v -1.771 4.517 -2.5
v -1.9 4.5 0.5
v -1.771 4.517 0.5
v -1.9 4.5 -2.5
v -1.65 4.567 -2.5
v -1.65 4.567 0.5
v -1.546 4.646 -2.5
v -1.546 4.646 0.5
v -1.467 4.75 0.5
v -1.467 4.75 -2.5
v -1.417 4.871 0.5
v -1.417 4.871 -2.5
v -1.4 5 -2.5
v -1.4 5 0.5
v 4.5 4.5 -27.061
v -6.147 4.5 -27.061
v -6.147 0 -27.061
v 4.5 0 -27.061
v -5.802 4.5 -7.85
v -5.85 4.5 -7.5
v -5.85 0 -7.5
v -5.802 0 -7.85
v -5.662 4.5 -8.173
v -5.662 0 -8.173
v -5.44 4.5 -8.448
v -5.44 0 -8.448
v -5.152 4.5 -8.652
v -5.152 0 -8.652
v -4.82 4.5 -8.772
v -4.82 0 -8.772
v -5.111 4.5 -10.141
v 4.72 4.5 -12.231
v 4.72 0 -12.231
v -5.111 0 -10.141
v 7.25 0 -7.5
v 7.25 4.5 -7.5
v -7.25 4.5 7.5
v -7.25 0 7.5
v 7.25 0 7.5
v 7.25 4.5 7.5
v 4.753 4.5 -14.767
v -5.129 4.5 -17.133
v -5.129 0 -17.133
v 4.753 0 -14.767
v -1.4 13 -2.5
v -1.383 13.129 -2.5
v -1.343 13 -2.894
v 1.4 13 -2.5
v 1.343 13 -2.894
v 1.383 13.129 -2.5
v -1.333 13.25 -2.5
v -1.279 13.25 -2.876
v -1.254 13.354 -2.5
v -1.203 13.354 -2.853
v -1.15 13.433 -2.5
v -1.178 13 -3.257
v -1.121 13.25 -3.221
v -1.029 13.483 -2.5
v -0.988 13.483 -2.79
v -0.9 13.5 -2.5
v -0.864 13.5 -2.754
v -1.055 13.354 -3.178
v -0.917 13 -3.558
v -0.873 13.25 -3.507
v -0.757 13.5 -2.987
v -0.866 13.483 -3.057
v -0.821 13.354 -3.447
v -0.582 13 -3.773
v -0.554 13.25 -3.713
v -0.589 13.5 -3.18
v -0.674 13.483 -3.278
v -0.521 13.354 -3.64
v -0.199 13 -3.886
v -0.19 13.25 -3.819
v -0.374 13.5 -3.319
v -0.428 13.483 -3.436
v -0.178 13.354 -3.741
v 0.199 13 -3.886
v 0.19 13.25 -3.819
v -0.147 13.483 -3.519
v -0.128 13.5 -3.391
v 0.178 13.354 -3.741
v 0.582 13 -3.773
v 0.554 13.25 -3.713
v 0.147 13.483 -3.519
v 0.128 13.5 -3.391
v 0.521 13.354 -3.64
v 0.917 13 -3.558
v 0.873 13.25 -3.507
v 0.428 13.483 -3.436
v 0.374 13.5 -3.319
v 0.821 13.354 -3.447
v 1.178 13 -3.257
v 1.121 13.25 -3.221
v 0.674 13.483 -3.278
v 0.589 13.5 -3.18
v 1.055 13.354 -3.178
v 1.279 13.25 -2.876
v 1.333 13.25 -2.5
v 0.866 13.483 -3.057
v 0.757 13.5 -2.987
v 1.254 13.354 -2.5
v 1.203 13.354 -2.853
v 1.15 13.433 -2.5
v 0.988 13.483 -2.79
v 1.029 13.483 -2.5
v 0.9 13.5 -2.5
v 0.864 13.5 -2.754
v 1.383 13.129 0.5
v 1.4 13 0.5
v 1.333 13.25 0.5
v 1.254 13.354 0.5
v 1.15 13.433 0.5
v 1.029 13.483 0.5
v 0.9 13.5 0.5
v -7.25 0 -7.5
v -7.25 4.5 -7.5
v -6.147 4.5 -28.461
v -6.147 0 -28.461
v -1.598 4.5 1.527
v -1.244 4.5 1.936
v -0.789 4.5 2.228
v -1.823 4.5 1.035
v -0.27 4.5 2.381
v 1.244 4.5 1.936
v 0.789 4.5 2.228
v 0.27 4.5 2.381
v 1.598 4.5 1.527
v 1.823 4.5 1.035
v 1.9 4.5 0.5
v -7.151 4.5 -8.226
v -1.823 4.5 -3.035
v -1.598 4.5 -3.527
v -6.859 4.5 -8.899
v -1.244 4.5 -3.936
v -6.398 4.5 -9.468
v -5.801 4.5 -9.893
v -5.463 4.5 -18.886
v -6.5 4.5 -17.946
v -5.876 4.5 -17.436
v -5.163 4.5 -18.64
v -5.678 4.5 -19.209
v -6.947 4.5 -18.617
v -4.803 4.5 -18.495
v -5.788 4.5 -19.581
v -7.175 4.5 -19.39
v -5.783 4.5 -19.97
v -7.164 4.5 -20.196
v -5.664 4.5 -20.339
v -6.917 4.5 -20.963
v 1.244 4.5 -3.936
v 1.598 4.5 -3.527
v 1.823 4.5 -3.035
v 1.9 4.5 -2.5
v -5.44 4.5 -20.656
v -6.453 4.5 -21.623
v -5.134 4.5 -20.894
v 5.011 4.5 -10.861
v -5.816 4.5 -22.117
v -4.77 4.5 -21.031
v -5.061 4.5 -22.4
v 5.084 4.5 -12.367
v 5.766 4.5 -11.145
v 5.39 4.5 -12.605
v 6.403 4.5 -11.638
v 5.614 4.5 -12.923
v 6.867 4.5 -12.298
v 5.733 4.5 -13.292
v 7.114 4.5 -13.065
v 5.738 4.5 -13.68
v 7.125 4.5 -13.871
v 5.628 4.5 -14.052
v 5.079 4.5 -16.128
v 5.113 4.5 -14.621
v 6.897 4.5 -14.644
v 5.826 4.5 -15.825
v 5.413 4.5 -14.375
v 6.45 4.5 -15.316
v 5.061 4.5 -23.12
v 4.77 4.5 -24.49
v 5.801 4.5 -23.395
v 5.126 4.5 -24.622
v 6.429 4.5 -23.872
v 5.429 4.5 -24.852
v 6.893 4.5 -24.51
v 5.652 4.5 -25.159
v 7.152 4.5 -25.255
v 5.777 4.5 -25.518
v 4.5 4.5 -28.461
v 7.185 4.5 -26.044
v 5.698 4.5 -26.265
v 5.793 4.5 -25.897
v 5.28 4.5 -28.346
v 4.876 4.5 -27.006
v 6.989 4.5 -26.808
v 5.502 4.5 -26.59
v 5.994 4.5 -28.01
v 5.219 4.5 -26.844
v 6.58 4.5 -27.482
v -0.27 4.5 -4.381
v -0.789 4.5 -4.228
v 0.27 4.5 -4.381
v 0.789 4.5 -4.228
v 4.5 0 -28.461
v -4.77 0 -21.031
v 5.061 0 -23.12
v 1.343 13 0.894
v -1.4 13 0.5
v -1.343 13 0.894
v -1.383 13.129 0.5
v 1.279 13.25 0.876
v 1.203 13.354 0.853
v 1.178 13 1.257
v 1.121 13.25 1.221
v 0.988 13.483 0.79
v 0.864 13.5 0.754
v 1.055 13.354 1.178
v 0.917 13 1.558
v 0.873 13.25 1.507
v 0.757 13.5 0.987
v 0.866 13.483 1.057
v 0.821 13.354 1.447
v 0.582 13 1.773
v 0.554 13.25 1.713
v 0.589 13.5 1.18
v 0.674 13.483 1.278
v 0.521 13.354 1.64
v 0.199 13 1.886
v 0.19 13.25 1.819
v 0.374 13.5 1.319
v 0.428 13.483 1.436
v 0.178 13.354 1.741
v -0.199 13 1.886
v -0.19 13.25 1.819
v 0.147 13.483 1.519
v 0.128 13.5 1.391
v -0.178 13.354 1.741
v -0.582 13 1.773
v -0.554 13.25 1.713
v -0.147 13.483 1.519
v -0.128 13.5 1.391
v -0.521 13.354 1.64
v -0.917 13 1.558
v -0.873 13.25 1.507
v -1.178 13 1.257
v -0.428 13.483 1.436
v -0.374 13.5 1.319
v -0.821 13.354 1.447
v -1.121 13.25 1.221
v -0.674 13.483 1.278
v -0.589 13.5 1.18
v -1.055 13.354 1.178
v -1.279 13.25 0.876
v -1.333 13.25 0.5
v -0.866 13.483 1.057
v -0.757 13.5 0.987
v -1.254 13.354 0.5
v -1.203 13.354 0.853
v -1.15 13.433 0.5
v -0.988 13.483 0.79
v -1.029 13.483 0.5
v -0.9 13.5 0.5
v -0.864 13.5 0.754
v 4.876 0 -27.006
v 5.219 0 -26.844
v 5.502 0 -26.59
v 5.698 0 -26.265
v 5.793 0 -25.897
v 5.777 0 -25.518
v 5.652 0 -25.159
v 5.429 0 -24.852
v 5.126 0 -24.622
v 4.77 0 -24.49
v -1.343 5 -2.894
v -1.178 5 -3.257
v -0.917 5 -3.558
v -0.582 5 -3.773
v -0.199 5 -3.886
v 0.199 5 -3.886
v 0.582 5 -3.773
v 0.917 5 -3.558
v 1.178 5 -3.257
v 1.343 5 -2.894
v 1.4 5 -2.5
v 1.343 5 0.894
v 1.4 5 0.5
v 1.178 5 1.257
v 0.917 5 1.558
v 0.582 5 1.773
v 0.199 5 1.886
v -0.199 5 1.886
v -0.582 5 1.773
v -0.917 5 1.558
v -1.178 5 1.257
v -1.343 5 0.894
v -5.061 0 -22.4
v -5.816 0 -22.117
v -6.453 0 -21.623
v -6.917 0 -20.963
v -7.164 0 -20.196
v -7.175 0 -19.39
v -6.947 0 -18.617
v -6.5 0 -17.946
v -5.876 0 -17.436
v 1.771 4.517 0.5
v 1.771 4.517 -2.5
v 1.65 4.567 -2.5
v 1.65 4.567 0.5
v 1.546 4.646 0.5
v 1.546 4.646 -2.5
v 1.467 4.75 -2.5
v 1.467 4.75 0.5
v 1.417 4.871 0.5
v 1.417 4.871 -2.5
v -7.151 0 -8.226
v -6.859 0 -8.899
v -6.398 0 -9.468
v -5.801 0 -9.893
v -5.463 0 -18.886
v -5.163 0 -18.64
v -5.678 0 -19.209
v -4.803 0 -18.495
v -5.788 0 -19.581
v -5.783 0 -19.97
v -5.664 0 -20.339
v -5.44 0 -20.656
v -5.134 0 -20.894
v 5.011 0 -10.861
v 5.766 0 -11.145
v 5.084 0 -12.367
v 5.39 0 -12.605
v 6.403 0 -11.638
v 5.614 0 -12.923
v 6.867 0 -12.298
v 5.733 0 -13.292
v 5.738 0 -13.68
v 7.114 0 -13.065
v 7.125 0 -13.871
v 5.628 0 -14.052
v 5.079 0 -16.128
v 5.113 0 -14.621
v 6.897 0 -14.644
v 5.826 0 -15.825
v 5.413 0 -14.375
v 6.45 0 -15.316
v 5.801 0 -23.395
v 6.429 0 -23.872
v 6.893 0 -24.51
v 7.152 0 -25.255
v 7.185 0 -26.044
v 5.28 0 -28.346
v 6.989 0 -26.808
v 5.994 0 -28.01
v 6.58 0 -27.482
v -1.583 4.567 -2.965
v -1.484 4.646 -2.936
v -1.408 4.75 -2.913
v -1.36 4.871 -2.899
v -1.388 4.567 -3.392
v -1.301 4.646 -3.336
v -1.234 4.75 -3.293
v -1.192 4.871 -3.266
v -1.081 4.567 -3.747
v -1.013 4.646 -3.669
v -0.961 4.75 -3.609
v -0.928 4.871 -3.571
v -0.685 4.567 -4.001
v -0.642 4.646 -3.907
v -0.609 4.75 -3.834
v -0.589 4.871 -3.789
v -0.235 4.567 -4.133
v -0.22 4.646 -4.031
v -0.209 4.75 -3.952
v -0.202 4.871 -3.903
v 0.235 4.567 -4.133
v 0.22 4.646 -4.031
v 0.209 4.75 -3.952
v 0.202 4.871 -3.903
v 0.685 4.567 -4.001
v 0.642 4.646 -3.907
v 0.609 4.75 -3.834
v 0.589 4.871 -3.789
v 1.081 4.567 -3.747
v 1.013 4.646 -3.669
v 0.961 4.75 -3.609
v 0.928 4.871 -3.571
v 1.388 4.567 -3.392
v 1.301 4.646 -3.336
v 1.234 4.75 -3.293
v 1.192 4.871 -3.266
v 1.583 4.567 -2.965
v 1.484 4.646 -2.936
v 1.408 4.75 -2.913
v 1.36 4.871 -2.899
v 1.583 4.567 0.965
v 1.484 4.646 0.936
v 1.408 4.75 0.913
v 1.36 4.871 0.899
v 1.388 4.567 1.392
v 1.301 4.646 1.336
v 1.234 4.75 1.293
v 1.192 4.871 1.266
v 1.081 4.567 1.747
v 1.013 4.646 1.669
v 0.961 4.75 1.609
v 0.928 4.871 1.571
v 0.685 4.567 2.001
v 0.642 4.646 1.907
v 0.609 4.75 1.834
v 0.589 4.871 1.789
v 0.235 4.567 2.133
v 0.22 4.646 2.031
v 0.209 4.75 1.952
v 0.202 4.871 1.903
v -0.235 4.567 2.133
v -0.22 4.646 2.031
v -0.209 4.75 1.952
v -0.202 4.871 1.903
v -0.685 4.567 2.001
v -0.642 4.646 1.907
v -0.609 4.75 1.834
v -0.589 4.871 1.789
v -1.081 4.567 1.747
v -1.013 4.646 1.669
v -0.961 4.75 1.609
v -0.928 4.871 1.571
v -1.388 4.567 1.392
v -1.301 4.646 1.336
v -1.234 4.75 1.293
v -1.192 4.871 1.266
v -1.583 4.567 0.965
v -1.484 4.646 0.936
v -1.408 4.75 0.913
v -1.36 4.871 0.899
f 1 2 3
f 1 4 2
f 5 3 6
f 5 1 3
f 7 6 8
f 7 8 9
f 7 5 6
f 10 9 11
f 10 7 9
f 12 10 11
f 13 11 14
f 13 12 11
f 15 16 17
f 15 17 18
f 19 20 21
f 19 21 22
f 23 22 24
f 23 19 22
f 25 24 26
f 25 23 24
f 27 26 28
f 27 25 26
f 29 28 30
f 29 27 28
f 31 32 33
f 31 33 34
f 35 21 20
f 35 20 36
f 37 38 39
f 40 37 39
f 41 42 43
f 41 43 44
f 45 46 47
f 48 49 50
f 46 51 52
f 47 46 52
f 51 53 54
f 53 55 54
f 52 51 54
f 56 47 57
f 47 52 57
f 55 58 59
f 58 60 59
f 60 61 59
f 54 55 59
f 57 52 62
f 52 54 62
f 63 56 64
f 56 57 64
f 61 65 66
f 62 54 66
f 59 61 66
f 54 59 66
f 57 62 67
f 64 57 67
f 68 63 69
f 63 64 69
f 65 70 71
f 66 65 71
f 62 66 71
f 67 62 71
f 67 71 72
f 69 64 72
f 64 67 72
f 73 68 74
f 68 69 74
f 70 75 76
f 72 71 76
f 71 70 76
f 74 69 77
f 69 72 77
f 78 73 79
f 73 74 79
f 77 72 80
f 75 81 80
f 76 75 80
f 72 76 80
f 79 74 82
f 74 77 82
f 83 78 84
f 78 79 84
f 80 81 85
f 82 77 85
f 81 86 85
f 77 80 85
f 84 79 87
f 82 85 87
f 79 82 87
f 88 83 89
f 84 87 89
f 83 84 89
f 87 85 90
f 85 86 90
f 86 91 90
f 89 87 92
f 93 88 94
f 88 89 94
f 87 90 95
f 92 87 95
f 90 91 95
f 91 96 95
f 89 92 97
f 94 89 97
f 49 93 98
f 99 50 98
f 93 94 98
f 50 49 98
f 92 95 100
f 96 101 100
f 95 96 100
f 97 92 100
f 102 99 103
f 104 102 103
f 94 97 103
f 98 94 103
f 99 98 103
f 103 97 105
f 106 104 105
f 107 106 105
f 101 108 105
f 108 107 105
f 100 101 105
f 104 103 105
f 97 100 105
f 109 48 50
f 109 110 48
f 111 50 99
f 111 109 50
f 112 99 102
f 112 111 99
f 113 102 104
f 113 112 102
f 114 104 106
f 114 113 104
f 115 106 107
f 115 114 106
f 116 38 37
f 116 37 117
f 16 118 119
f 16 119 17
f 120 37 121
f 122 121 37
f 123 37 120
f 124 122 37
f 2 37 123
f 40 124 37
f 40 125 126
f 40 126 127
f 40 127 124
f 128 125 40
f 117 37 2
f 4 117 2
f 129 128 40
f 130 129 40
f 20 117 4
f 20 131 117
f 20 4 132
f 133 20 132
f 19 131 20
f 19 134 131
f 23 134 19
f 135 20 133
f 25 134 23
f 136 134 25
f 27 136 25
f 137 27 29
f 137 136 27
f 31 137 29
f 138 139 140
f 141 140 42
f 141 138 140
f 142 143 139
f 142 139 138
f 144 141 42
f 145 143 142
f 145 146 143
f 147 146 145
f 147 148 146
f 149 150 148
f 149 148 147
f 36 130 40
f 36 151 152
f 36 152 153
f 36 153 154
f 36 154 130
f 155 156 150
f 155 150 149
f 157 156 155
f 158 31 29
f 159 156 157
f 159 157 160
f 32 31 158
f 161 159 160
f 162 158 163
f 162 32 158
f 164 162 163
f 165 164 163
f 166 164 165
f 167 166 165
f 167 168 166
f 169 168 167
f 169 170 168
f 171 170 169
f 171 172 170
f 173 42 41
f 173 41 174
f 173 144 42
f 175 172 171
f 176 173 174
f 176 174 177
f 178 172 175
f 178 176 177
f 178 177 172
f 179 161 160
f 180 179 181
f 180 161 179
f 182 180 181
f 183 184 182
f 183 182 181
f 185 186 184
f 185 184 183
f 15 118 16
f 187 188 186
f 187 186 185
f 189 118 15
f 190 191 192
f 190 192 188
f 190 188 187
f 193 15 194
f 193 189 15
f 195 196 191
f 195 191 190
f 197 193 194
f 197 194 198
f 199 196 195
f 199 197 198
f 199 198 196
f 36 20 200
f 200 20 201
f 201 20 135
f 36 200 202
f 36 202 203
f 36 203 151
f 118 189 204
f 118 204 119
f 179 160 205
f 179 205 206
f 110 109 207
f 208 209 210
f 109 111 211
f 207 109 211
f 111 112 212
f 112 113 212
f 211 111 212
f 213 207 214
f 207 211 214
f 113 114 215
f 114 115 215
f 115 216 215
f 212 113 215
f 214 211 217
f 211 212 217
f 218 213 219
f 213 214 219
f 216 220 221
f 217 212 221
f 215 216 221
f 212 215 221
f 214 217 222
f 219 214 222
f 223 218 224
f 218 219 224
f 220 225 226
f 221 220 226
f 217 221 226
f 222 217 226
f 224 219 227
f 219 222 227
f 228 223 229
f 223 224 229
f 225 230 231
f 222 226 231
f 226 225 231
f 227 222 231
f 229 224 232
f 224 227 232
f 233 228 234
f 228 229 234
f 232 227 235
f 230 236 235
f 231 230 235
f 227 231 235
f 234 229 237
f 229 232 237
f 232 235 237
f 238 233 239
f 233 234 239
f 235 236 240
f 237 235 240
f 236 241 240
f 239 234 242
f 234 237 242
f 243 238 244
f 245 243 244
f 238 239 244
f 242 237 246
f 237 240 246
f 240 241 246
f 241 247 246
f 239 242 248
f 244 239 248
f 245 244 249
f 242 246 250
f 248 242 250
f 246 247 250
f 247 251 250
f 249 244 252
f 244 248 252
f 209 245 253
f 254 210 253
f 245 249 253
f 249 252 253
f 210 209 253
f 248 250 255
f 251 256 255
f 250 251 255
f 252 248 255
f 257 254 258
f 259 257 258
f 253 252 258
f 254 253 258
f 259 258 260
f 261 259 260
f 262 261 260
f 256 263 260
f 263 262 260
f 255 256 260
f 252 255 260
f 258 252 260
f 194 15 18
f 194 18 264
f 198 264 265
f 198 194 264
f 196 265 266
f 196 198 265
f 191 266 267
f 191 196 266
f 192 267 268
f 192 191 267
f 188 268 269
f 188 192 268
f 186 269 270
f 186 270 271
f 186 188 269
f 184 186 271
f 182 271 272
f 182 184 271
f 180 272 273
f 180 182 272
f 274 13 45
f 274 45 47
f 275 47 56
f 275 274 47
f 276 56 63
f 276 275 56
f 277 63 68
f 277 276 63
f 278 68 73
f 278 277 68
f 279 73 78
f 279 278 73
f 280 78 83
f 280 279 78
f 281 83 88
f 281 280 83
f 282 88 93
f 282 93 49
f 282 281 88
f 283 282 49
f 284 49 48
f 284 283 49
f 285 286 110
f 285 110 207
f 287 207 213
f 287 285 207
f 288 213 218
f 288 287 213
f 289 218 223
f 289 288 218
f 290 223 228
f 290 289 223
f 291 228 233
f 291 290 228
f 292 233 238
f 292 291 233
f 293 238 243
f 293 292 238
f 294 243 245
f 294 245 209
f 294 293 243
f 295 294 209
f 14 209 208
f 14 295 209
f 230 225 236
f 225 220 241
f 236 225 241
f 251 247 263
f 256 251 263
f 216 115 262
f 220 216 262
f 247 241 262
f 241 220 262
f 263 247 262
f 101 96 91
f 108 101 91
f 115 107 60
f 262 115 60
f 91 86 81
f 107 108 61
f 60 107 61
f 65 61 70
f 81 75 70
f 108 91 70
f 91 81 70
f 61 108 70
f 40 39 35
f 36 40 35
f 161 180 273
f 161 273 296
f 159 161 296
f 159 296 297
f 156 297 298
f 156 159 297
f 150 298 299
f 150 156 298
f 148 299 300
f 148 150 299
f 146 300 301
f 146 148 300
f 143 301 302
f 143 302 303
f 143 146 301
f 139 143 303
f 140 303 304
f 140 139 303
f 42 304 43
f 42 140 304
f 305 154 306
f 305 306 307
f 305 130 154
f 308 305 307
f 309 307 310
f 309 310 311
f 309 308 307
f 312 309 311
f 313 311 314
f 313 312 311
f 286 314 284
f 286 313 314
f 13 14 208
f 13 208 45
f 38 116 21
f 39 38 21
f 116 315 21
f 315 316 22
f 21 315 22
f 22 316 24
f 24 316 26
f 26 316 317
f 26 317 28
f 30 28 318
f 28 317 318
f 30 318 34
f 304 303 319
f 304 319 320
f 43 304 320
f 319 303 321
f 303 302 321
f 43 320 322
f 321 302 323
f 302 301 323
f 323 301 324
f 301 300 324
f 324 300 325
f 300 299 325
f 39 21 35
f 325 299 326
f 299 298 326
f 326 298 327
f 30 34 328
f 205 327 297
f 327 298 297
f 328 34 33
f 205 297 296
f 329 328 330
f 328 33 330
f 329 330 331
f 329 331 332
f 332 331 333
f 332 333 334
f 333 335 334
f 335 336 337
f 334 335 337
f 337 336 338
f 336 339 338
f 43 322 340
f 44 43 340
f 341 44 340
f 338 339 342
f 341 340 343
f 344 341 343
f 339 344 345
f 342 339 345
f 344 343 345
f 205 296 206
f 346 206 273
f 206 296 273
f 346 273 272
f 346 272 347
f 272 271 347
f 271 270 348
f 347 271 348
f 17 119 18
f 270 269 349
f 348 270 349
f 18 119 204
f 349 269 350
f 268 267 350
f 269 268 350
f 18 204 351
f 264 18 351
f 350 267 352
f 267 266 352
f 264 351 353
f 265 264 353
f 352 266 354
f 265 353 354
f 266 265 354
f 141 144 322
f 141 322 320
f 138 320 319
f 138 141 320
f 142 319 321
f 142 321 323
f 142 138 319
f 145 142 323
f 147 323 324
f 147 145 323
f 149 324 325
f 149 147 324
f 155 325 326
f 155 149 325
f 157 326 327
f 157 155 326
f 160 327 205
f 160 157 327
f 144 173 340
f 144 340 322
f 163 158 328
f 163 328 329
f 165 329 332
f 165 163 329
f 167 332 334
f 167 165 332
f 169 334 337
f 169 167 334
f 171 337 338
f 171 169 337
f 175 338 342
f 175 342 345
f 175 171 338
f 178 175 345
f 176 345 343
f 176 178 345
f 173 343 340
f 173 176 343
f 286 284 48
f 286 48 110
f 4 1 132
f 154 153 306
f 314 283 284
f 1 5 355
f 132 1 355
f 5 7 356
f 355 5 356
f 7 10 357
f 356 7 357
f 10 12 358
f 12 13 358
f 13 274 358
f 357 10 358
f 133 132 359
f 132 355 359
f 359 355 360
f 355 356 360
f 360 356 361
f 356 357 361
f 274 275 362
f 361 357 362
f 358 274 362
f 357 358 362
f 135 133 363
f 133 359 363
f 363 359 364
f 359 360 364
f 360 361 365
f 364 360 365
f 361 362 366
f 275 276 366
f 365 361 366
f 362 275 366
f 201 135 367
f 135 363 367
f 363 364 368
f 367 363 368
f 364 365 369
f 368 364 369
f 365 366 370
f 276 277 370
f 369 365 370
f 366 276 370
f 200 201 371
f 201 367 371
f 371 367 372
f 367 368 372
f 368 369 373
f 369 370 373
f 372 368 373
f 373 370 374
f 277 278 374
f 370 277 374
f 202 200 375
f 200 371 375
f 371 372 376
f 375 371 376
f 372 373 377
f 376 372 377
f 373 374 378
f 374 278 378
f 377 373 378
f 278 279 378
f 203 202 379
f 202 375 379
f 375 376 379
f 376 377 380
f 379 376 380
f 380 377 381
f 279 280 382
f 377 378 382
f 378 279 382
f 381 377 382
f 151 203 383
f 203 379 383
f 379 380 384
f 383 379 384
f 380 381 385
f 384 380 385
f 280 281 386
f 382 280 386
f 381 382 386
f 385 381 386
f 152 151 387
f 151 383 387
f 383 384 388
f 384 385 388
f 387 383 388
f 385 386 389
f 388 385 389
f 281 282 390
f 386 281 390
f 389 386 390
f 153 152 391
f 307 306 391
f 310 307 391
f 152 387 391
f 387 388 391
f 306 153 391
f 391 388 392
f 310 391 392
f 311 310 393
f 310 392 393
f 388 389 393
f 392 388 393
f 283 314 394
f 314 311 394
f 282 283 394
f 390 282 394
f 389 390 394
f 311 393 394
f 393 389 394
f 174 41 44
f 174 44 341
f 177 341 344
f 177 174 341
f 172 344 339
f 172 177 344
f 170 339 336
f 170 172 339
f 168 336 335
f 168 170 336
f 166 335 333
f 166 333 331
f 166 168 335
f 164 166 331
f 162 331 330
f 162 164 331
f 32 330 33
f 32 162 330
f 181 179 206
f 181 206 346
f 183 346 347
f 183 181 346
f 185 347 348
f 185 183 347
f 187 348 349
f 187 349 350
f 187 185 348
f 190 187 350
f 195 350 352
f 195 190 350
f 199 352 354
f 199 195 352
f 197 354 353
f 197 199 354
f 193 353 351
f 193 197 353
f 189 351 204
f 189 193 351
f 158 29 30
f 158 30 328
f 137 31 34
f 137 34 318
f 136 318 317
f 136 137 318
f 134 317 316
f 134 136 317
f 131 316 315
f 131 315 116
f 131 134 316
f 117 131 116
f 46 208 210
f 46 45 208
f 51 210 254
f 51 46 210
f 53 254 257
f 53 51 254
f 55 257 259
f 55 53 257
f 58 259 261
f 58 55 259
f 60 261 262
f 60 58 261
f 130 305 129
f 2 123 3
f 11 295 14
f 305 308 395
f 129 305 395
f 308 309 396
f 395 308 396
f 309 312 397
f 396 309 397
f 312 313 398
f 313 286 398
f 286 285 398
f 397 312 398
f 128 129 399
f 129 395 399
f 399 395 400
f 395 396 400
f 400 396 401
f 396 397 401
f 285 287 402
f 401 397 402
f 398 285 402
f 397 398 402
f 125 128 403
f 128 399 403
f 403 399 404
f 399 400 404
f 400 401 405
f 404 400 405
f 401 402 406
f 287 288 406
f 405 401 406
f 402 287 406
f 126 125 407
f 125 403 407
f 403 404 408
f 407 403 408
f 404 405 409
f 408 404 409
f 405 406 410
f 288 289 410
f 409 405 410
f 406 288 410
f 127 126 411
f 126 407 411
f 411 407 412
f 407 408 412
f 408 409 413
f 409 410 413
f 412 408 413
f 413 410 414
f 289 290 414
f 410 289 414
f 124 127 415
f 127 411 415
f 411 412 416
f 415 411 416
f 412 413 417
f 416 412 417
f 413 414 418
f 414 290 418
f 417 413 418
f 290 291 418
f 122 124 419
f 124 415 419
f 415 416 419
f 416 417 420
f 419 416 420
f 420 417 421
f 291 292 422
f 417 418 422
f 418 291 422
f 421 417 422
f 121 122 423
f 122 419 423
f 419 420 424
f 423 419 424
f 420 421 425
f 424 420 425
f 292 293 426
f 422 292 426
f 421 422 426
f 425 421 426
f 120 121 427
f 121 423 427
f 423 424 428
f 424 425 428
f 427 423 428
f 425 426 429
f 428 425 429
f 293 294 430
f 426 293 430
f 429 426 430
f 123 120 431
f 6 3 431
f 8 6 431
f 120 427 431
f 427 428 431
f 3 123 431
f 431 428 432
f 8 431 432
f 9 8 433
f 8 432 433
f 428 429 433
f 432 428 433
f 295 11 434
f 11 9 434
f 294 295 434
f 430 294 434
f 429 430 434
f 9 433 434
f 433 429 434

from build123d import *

# Parameters (mm, degrees)
SKETCH1_W           = 14.5
SKETCH1_H           = 15
BOSS_EXTRUDE1_DEPTH = 4.5
EXTRUDE_THIN1_DEPTH = 4.5
BOSS_EXTRUDE2_DEPTH = 9
FILLET2_R           = 0.5


with BuildPart() as part:
    # Sketch1 → Boss-Extrude1 (new body)
    with BuildSketch(Plane(origin=(0, 0, 0), x_dir=(1, 0, 0), z_dir=(0, 1, 0))):
        Rectangle(SKETCH1_W, SKETCH1_H)
    extrude(amount=BOSS_EXTRUDE1_DEPTH)

    # Sketch2 → Extrude-Thin1 (add)
    with BuildSketch(Plane(origin=(0, 4.5, 0), x_dir=(1, 0, 0), z_dir=(0, 1, 0))):
        with BuildLine():
            Line((-5.85, 5.540513031), (-5.85, 7.5))
            ThreePointArc((-5.85, 7.5), (-5.56028975, 8.318116508), (-4.820285198, 8.771591881))
            Line((-4.820285198, 8.771591881), (5.011361565, 10.861372913))
            ThreePointArc((5.011361565, 10.861372913), (7.149778281, 13.467770346), (5.078861565, 16.128115735))
            Line((5.078861565, 16.128115735), (-4.802785198, 18.494754348))
            ThreePointArc((-4.802785198, 18.494754348), (-5.799893246, 19.775661387), (-4.770285198, 21.030593485))
            Line((-4.770285198, 21.030593485), (5.061361565, 23.120374517))
            ThreePointArc((5.061361565, 23.120374517), (7.185209117, 26.043599889), (4.5, 28.461373039))
            Line((4.5, 28.461373039), (-6.14655289, 28.461373039))
            Line((-6.14655289, 28.461373039), (-6.14655289, 27.061373039))
            Line((-6.14655289, 27.061373039), (4.5, 27.061373039))
            ThreePointArc((4.5, 27.061373039), (5.792878464, 25.897260041), (4.770285198, 24.489781158))
            Line((4.770285198, 24.489781158), (-5.061361565, 22.400000126))
            ThreePointArc((-5.061361565, 22.400000126), (-7.199778281, 19.793602693), (-5.128861565, 17.133257304))
            Line((-5.128861565, 17.133257304), (4.752785198, 14.76661869))
            ThreePointArc((4.752785198, 14.76661869), (5.749893246, 13.485711651), (4.720285198, 12.230779554))
            Line((4.720285198, 12.230779554), (-5.111361565, 10.140998522))
            ThreePointArc((-5.111361565, 10.140998522), (-6.648294096, 9.199165056), (-7.25, 7.5))
            Line((-7.25, 7.5), (-7.25, 5.540513031))
            Line((-7.25, 5.540513031), (-5.85, 5.540513031))
        make_face()
    extrude(amount=-EXTRUDE_THIN1_DEPTH)

    # Sketch3 → Boss-Extrude2 (add)
    with BuildSketch(Plane(origin=(0, 4.5, 0), x_dir=(1, 0, 0), z_dir=(0, 1, 0))):
        with BuildLine():
            Line((1.4, 2.5), (1.4, -0.5))
            ThreePointArc((1.4, -0.5), (0, -1.9), (-1.4, -0.5))
            Line((-1.4, -0.5), (-1.4, 2.5))
            ThreePointArc((-1.4, 2.5), (0, 3.9), (1.4, 2.5))
        make_face()
    extrude(amount=BOSS_EXTRUDE2_DEPTH)

    # Fillet2
    fillet2_edges = [part.edges().sort_by_distance(p)[0] for p in [
        (0, 4.5, -3.9),
        (-1.4, 4.5, -1),
        (0, 4.5, 1.9),
        (1.4, 4.5, -1),
        (0, 13.5, -3.9),
        (-1.4, 13.5, -1),
        (0, 13.5, 1.9),
        (1.4, 13.5, -1),
    ]]
    fillet(fillet2_edges, radius=FILLET2_R)


solid = part.part
